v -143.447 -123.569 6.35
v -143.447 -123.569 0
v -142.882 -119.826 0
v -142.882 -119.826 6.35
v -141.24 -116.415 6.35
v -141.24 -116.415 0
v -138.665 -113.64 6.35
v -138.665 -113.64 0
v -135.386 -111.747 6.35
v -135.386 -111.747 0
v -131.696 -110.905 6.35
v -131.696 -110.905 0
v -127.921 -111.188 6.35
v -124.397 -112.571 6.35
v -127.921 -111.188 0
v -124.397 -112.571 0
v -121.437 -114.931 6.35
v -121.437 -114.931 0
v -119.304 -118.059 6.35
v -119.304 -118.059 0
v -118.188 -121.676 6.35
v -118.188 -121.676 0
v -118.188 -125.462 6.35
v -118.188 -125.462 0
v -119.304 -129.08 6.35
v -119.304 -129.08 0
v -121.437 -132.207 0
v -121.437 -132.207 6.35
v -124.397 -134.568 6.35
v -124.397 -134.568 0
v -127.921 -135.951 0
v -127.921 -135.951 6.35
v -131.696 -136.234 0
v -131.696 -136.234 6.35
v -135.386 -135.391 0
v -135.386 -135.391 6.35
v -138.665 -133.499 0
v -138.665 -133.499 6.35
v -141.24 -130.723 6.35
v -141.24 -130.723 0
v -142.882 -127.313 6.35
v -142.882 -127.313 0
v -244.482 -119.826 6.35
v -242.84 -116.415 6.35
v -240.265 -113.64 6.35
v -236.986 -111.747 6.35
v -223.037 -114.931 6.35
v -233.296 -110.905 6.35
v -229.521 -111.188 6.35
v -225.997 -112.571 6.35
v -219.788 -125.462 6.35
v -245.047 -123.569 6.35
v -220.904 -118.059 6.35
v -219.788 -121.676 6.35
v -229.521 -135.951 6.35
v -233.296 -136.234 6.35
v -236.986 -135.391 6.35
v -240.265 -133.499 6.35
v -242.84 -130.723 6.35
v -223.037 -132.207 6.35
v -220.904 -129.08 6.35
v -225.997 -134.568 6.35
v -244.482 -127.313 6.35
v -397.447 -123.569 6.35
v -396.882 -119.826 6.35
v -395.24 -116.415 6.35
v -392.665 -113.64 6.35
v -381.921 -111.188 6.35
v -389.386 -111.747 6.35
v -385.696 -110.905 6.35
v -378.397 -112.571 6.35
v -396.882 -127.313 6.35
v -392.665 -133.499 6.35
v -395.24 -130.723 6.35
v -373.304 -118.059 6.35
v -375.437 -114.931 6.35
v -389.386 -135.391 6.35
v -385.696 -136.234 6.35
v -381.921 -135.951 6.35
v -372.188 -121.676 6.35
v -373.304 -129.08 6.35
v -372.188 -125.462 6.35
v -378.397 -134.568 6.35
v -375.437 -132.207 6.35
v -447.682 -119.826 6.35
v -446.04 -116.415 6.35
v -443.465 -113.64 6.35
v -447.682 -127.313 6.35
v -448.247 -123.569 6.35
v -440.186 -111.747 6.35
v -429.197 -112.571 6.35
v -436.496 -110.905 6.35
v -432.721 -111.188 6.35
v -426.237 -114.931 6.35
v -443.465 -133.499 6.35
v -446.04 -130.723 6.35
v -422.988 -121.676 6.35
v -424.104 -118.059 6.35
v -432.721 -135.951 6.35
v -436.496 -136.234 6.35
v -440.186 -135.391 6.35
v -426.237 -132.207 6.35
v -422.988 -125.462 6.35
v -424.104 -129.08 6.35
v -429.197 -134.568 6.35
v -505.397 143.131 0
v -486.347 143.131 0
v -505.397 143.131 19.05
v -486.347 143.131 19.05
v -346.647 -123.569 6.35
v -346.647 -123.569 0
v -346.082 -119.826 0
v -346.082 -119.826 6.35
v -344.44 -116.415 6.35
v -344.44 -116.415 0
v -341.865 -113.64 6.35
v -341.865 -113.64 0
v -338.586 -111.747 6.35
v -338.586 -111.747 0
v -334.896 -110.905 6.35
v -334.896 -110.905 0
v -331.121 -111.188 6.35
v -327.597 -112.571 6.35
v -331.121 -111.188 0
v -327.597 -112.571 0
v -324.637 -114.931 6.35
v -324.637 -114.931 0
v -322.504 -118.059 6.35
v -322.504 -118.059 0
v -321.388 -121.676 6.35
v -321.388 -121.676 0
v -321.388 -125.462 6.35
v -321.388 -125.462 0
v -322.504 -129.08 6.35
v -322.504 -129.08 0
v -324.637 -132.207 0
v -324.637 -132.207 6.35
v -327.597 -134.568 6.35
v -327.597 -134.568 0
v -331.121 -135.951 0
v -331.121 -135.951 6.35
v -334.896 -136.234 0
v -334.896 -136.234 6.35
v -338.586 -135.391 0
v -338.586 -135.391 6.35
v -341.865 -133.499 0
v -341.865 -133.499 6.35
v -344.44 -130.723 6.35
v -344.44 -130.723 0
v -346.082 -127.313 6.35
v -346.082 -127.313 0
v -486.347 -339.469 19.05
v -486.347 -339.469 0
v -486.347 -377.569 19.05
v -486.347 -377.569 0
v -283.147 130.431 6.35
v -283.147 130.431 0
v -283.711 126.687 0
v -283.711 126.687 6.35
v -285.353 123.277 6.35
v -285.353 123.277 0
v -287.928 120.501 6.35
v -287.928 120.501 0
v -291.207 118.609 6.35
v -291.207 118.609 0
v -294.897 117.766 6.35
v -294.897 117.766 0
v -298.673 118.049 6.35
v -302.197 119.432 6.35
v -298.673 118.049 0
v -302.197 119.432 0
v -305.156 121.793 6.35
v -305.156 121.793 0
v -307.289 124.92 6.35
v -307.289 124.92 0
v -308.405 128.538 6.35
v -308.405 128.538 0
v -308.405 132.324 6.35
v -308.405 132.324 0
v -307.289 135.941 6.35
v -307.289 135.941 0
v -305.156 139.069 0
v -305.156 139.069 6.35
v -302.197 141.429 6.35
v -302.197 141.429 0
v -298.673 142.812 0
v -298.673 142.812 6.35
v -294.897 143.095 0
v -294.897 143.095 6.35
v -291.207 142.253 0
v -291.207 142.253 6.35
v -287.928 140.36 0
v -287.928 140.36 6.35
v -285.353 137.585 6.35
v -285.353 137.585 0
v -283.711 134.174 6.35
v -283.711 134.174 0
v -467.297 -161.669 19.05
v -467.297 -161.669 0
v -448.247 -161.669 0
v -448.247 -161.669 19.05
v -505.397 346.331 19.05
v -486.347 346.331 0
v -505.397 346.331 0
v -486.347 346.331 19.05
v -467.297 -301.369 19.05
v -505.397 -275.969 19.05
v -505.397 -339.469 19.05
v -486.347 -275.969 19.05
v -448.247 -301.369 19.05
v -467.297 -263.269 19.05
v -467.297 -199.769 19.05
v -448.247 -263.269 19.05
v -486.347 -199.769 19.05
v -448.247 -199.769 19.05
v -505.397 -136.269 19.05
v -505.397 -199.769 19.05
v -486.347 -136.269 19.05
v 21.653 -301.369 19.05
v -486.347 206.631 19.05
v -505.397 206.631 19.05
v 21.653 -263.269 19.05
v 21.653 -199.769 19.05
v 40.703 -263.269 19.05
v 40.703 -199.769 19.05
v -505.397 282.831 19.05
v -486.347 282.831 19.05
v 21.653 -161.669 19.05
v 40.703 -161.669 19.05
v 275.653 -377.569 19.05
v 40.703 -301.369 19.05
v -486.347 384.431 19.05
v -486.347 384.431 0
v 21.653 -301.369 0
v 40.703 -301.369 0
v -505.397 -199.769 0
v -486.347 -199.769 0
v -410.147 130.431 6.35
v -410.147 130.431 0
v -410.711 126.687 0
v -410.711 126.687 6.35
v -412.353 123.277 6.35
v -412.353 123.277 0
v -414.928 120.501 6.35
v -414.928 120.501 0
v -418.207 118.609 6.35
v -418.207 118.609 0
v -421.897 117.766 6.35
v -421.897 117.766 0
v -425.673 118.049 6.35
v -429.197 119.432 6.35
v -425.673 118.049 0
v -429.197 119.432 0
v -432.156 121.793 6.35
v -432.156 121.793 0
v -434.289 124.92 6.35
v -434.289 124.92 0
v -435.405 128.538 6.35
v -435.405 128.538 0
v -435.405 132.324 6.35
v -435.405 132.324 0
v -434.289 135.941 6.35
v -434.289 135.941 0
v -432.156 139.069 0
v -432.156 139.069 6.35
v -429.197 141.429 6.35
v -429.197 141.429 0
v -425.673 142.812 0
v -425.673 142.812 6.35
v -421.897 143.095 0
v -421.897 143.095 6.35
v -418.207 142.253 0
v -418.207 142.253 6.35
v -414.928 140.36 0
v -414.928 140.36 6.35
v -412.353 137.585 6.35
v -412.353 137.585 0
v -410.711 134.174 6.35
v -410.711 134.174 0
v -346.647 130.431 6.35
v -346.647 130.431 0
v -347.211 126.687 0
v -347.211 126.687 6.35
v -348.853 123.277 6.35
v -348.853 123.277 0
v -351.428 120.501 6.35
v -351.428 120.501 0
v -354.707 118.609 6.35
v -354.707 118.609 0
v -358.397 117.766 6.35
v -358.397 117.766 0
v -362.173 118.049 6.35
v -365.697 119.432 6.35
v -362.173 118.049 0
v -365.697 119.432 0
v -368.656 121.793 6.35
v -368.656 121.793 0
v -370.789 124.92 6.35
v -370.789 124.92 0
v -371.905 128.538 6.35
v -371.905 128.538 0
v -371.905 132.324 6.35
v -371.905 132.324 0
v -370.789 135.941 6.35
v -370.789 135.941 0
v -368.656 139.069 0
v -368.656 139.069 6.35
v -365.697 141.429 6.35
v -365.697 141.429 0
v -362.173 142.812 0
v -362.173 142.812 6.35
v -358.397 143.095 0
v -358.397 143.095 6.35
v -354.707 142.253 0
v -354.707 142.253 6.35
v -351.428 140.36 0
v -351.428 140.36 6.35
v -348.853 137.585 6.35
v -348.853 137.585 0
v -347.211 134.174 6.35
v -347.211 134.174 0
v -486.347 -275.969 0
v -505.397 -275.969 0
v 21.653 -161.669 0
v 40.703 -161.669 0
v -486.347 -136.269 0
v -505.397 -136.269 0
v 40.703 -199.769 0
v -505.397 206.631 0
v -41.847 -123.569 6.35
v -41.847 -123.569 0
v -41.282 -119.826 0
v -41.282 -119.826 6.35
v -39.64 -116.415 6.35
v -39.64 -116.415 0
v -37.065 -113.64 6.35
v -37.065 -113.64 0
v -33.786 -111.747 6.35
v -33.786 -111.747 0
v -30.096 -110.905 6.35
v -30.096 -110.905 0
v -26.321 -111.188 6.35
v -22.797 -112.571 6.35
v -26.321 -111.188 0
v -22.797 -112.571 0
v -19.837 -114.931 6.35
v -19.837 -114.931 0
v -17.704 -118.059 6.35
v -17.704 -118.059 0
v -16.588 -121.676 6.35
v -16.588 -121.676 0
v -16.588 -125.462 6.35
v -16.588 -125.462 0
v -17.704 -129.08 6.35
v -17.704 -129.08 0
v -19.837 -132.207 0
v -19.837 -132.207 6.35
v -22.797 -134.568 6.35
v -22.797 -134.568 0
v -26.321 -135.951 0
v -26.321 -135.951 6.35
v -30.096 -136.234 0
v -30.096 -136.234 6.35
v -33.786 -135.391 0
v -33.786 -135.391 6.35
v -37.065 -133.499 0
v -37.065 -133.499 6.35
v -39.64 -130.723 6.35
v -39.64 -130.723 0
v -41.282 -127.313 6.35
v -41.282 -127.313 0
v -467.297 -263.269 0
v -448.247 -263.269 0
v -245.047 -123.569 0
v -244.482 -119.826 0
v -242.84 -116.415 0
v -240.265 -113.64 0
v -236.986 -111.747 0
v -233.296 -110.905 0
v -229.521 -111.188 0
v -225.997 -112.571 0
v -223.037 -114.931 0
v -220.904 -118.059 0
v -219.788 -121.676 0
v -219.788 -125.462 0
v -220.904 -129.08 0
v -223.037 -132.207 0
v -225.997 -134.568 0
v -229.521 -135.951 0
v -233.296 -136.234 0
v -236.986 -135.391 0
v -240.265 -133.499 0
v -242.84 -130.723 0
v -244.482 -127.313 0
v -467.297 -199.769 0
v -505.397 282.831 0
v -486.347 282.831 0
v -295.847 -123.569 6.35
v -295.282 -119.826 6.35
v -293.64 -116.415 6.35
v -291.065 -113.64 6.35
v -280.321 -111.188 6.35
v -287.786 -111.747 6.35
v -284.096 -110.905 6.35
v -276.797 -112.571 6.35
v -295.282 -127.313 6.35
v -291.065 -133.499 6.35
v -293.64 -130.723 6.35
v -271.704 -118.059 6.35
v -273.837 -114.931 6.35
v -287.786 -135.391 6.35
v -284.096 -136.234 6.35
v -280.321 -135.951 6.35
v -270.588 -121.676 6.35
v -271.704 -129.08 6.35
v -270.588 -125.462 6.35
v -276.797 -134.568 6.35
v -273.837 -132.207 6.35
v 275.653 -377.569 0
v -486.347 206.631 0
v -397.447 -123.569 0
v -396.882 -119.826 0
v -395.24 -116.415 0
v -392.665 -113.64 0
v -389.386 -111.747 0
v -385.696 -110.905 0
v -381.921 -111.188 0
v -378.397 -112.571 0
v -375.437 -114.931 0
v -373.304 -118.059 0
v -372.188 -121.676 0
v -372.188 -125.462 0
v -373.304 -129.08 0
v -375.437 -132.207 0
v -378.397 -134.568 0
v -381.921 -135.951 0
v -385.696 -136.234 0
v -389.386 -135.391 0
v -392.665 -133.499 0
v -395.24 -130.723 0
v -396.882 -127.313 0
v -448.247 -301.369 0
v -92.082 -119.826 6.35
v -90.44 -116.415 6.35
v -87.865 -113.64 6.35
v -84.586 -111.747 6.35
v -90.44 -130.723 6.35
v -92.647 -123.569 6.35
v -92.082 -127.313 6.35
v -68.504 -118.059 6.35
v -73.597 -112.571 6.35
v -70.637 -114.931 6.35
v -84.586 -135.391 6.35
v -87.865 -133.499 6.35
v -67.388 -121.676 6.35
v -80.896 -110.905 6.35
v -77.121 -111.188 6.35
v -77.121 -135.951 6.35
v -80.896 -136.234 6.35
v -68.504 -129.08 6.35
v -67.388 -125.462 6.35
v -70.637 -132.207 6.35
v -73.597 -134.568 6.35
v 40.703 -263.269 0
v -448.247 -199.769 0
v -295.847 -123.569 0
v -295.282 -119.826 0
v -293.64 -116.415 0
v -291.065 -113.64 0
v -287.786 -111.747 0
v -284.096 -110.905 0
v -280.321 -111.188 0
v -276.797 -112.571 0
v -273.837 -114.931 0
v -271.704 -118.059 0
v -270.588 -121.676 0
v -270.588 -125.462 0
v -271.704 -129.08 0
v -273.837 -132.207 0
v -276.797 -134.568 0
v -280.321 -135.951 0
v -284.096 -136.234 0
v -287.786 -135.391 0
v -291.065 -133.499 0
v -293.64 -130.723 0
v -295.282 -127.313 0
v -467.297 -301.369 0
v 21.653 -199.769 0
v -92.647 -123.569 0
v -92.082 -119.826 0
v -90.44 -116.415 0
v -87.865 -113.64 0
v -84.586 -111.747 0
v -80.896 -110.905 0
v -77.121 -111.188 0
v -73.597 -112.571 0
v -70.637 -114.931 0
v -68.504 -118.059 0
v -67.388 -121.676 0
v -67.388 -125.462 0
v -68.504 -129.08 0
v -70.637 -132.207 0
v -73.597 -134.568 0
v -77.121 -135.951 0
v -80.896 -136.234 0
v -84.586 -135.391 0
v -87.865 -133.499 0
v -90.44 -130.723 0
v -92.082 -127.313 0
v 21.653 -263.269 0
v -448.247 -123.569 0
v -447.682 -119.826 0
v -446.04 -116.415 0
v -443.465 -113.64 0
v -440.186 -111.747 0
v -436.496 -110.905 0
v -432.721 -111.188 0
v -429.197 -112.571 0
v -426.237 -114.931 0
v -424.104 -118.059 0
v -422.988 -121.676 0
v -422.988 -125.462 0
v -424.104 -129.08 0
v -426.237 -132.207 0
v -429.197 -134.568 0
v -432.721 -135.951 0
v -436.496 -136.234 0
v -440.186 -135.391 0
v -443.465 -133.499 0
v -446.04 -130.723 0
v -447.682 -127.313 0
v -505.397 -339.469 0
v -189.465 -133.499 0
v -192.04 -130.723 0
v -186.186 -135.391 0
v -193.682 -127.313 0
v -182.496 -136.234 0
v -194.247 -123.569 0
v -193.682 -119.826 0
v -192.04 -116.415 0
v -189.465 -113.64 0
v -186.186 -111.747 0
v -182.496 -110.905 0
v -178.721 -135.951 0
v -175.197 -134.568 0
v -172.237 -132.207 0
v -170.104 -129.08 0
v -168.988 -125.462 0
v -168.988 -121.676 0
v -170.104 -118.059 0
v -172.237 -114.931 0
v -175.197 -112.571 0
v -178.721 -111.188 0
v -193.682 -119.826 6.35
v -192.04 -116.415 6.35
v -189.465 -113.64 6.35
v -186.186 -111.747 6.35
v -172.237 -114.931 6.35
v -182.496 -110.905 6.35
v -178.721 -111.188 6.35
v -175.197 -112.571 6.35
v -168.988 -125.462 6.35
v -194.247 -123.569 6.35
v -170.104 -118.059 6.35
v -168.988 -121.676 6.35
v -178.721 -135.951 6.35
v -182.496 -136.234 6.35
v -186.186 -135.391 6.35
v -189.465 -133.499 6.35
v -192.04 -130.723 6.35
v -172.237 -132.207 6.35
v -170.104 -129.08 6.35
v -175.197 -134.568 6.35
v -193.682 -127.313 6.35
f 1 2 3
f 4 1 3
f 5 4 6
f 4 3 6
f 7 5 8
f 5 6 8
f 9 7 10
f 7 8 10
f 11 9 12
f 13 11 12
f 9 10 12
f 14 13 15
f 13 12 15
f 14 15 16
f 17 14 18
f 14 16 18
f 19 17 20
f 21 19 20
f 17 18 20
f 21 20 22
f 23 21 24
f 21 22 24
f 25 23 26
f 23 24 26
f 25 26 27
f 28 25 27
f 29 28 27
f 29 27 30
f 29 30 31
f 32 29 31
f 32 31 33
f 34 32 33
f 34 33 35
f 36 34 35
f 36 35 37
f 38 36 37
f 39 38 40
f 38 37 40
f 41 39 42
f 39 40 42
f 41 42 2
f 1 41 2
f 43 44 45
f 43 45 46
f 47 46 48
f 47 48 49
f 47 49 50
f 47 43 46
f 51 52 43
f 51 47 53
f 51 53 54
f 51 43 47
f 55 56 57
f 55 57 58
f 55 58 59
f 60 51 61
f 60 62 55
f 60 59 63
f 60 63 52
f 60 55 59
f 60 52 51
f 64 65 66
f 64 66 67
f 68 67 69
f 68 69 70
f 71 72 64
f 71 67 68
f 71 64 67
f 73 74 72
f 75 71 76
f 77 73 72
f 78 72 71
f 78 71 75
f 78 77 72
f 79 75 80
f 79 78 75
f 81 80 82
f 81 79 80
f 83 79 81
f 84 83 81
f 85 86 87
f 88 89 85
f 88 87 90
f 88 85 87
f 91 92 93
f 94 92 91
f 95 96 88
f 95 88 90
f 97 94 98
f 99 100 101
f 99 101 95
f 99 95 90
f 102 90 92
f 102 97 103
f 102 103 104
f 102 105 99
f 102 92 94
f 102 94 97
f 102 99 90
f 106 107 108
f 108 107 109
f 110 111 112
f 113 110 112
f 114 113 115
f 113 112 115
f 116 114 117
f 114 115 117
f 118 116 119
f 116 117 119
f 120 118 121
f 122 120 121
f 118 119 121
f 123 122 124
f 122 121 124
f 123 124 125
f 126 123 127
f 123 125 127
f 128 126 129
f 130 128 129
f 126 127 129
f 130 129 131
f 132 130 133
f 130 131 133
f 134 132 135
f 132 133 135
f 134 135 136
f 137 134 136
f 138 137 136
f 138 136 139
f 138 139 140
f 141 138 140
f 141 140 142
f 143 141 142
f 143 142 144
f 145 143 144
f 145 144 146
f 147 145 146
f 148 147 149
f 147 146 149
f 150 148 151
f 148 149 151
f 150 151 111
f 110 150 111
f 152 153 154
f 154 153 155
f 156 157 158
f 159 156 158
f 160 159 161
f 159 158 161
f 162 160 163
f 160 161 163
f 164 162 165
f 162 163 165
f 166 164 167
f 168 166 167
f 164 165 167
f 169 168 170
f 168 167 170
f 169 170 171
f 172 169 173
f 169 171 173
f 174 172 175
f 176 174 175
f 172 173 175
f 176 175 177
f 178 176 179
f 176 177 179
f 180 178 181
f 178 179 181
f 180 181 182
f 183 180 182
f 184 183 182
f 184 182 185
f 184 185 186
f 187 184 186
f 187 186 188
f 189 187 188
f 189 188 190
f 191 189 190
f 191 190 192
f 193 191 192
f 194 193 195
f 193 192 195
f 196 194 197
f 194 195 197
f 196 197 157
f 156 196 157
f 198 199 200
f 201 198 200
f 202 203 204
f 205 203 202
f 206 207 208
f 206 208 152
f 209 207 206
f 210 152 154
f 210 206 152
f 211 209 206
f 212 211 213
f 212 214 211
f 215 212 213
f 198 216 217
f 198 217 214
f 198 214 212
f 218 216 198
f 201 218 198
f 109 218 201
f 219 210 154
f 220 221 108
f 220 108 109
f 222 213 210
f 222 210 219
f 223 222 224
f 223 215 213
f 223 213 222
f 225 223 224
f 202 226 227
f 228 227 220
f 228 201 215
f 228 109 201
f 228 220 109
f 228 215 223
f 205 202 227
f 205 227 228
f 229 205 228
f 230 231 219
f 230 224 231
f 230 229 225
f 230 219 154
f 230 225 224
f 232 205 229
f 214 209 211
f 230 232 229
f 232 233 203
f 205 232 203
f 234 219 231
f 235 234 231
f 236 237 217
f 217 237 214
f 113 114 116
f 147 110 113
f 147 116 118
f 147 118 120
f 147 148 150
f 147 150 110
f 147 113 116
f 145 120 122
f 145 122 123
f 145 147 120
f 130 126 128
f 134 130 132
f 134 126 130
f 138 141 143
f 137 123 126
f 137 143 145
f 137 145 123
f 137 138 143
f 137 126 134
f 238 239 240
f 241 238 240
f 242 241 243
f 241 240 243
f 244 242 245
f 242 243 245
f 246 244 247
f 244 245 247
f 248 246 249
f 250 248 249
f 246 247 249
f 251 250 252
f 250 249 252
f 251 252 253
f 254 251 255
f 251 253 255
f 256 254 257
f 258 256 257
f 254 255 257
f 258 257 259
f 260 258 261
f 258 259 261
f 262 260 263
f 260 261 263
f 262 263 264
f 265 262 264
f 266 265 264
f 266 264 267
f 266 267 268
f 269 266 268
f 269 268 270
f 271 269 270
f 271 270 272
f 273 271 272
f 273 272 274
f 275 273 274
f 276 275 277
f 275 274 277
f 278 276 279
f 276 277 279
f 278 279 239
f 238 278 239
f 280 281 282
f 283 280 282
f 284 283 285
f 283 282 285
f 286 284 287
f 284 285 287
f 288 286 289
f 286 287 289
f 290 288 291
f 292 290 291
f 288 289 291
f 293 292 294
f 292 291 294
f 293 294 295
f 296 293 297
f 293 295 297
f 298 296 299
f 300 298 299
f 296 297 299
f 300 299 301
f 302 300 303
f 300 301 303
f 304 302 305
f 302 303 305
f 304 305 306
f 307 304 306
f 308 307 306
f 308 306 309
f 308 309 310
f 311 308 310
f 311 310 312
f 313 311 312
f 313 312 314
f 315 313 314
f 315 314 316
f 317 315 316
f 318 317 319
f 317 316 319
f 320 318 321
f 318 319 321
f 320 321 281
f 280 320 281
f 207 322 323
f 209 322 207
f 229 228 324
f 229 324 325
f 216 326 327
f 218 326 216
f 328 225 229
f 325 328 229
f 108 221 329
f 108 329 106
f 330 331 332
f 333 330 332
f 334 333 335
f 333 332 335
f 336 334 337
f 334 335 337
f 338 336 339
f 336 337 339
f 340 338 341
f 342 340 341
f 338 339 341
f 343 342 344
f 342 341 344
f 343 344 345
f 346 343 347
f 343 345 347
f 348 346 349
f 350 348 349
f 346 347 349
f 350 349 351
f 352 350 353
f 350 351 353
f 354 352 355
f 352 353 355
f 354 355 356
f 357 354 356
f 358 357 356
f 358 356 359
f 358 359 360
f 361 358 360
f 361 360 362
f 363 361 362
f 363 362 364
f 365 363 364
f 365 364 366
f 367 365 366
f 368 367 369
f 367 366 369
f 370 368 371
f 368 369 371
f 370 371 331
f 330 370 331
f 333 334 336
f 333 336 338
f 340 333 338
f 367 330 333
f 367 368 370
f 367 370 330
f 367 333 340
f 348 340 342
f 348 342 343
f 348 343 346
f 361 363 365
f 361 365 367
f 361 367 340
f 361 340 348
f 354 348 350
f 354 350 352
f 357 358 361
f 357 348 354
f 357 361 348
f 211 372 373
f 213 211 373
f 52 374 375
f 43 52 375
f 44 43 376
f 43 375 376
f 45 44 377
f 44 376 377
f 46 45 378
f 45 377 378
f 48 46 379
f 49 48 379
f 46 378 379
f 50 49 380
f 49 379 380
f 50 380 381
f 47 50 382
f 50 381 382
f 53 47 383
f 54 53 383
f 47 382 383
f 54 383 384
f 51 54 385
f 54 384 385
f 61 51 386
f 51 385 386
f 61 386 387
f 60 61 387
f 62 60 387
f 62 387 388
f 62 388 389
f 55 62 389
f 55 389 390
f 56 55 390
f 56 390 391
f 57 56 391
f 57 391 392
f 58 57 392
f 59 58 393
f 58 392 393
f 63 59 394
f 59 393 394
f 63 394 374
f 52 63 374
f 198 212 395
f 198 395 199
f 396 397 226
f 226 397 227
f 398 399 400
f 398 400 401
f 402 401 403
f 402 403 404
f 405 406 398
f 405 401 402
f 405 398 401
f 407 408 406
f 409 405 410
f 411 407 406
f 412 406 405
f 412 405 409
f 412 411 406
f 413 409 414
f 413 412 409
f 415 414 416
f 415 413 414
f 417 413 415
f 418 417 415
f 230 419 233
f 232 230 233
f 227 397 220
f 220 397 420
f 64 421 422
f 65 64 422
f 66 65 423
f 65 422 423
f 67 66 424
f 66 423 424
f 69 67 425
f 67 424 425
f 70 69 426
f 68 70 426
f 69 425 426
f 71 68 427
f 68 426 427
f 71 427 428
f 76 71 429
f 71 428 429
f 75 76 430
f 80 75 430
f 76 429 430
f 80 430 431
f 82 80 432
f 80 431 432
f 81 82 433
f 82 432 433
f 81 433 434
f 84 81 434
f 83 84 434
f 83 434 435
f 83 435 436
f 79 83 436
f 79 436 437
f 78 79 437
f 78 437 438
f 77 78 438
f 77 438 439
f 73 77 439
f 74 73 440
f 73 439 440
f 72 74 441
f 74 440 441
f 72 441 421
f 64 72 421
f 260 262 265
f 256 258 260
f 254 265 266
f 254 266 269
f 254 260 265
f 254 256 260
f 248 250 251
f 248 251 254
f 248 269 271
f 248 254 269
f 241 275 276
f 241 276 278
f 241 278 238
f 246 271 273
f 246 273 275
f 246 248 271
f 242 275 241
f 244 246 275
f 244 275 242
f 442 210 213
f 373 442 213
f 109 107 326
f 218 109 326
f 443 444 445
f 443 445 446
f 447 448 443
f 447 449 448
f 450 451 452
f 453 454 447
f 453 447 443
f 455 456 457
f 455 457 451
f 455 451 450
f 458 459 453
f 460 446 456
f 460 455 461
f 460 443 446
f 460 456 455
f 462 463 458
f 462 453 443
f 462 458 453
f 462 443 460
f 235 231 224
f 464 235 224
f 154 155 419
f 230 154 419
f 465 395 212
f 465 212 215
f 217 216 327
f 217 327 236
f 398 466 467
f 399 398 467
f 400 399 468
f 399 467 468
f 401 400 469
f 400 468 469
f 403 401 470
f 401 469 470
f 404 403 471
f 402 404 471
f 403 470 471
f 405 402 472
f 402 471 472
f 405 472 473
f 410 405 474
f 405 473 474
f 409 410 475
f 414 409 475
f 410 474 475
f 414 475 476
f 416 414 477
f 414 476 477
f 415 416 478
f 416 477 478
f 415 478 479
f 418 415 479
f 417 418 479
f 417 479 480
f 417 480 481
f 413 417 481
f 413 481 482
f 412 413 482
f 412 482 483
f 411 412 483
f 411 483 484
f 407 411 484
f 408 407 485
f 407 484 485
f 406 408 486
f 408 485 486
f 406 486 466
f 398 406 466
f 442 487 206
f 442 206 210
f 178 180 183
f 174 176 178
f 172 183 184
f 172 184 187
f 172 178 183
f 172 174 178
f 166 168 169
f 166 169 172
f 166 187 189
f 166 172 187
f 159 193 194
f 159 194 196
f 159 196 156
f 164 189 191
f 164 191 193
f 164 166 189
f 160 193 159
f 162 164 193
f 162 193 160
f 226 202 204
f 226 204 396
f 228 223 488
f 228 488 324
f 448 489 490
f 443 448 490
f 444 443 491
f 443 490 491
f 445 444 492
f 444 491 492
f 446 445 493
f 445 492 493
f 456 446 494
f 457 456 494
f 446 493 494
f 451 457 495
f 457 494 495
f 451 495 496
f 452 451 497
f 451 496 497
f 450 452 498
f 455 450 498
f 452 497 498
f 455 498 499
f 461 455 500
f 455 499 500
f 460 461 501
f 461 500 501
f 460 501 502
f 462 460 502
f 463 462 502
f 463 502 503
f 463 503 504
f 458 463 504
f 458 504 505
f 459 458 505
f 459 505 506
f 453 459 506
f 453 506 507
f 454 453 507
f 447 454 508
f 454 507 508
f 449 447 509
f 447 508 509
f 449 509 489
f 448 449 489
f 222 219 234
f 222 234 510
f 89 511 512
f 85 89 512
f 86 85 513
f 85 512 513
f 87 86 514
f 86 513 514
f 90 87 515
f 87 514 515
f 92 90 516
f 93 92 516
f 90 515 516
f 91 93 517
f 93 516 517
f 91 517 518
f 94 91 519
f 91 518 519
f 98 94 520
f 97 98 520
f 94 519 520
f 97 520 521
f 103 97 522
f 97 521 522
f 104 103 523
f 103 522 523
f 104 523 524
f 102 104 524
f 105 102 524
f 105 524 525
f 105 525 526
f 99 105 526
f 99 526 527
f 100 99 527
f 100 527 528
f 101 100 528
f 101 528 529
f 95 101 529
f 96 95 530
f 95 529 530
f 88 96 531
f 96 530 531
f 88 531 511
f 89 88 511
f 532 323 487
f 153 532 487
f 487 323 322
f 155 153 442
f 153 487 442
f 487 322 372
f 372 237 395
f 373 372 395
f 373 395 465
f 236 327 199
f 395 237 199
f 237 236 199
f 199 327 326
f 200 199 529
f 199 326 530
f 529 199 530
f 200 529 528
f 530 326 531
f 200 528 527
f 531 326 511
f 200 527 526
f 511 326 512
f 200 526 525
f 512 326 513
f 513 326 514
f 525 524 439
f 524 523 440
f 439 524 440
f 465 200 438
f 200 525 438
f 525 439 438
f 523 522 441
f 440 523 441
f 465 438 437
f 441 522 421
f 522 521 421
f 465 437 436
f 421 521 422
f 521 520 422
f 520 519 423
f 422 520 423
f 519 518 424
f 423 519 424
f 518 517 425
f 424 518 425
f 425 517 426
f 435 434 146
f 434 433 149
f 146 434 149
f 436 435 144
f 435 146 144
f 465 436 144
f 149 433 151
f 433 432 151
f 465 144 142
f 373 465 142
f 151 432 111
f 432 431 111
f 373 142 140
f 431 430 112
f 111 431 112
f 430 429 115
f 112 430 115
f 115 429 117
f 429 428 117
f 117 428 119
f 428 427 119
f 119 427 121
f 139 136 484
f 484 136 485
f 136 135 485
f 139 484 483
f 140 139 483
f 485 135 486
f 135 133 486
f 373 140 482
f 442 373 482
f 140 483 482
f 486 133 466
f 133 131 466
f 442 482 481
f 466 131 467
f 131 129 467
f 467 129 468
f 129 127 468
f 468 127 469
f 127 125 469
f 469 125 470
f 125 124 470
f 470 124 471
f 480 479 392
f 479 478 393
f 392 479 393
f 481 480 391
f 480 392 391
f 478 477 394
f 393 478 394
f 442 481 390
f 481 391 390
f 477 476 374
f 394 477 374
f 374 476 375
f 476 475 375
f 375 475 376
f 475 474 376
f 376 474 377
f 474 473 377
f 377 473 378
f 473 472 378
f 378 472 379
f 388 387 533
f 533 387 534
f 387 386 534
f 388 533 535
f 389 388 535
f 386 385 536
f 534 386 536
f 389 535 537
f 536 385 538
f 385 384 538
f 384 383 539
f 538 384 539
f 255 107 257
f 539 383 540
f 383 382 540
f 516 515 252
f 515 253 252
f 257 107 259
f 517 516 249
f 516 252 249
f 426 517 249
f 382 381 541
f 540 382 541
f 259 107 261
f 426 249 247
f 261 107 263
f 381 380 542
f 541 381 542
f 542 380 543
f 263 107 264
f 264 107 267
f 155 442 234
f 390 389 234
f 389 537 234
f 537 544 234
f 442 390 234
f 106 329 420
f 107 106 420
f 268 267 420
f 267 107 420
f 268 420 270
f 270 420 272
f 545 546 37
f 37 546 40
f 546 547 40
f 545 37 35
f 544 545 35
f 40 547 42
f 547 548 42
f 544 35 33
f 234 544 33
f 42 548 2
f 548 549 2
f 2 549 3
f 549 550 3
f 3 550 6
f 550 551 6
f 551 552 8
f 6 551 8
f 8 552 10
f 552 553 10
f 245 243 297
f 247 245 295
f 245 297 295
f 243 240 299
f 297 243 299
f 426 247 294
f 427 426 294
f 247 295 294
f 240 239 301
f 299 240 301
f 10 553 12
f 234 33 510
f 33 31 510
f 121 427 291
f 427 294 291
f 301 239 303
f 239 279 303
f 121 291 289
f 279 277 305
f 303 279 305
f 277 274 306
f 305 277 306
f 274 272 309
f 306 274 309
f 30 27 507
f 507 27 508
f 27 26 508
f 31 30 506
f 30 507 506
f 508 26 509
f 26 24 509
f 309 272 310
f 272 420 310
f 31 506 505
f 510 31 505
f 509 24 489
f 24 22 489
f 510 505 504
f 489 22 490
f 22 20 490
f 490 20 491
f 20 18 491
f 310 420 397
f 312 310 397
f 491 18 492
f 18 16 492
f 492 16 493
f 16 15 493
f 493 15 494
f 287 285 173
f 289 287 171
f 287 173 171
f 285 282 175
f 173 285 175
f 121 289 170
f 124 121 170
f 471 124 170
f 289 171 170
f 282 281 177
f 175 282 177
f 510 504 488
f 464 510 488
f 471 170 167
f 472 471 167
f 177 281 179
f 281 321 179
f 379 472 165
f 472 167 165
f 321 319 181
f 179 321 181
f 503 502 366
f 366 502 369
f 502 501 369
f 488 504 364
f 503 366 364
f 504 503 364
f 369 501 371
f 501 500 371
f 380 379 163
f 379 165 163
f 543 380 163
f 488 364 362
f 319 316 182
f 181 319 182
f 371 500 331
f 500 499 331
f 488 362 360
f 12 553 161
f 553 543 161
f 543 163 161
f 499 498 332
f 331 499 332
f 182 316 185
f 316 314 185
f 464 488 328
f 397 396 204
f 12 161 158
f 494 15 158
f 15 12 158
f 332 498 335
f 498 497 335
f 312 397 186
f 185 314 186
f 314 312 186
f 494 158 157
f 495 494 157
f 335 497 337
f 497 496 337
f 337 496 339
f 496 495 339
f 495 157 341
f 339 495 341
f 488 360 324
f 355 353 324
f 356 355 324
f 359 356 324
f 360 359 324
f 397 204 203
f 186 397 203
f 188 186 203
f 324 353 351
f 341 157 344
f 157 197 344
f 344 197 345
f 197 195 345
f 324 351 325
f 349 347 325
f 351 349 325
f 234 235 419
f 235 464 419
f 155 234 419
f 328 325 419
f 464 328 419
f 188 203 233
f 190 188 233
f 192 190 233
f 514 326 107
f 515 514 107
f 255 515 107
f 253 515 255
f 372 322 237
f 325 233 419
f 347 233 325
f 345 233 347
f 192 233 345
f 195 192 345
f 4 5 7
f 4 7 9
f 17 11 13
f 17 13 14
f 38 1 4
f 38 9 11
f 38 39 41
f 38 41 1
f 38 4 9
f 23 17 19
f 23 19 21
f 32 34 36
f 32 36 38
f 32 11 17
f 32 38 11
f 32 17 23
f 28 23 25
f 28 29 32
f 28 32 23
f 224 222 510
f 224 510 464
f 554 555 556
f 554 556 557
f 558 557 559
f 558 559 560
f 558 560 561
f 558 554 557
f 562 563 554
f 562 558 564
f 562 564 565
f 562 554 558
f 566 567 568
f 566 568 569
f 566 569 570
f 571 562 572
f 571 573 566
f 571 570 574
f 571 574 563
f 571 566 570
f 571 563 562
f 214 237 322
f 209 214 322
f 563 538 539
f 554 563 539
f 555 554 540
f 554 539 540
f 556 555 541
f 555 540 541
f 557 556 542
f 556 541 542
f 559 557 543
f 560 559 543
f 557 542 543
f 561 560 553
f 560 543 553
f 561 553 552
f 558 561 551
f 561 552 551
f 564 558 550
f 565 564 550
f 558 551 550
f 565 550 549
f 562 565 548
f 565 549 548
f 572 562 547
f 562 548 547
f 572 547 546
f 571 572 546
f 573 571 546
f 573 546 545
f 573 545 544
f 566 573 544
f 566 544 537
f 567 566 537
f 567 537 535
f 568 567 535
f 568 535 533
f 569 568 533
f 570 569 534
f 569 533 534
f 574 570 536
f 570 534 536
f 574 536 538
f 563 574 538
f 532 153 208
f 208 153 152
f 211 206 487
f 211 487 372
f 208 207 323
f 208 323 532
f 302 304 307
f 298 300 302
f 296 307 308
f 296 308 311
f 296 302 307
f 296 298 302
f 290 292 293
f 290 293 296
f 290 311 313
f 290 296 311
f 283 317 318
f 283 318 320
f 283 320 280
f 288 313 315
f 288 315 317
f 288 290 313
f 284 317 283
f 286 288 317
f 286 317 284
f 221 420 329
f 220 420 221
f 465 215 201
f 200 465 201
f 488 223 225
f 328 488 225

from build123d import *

# Parameters (mm, degrees)
F1_DEPTH = 19.05
F3_DEPTH = 6.35
F4_W     = 19.05
F4_H     = 38.1
F5_DEPTH = 25.4
F6_W     = 63.5
F6_H     = 19.05
F7_DEPTH = 19.05


with BuildPart() as f1:
    # F0 (on Top) → F1 (new body)
    with BuildSketch(Plane.XY):
        Polygon((-486.346572, 384.430752), (-486.346572, -377.569248), (275.653428, -377.569248), align=None)
    extrude(amount=F1_DEPTH)

    # F2 (on face) → F3 (cut)
    with BuildSketch(Plane(origin=(0, 0, 0), x_dir=(1, 0, 0), z_dir=(0, 0, -1))):
        with BuildLine():
            ThreePointArc((-422.846572, 123.569248), (-435.546572, 136.269248), (-448.246572, 123.569248))
            Line((-448.246572, 123.569248), (-422.846572, 123.569248))
        make_face()
        with BuildLine():
            ThreePointArc((-16.446572, 123.569248), (-29.146572, 136.269248), (-41.846572, 123.569248))
            Line((-41.846572, 123.569248), (-16.446572, 123.569248))
        make_face()
        with BuildLine():
            Line((-16.446572, 123.569248), (-41.846572, 123.569248))
            ThreePointArc((-41.846572, 123.569248), (-29.146572, 110.869248), (-16.446572, 123.569248))
        make_face()
        with BuildLine():
            ThreePointArc((-67.246572, 123.569248), (-79.946572, 136.269248), (-92.646572, 123.569248))
            Line((-92.646572, 123.569248), (-67.246572, 123.569248))
        make_face()
        with BuildLine():
            Line((-67.246572, 123.569248), (-92.646572, 123.569248))
            ThreePointArc((-92.646572, 123.569248), (-79.946572, 110.869248), (-67.246572, 123.569248))
        make_face()
        with BuildLine():
            ThreePointArc((-118.046572, 123.569248), (-130.746572, 136.269248), (-143.446572, 123.569248))
            Line((-143.446572, 123.569248), (-118.046572, 123.569248))
        make_face()
        with BuildLine():
            Line((-118.046572, 123.569248), (-143.446572, 123.569248))
            ThreePointArc((-143.446572, 123.569248), (-130.746572, 110.869248), (-118.046572, 123.569248))
        make_face()
        with BuildLine():
            ThreePointArc((-168.846572, 123.569248), (-181.546572, 136.269248), (-194.246572, 123.569248))
            Line((-194.246572, 123.569248), (-168.846572, 123.569248))
        make_face()
        with BuildLine():
            Line((-168.846572, 123.569248), (-194.246572, 123.569248))
            ThreePointArc((-194.246572, 123.569248), (-181.546572, 110.869248), (-168.846572, 123.569248))
        make_face()
        with BuildLine():
            ThreePointArc((-219.646572, 123.569248), (-232.346572, 136.269248), (-245.046572, 123.569248))
            Line((-245.046572, 123.569248), (-219.646572, 123.569248))
        make_face()
        with BuildLine():
            Line((-219.646572, 123.569248), (-245.046572, 123.569248))
            ThreePointArc((-245.046572, 123.569248), (-232.346572, 110.869248), (-219.646572, 123.569248))
        make_face()
        with BuildLine():
            ThreePointArc((-270.446572, 123.569248), (-283.146572, 136.269248), (-295.846572, 123.569248))
            Line((-295.846572, 123.569248), (-270.446572, 123.569248))
        make_face()
        with BuildLine():
            Line((-270.446572, 123.569248), (-295.846572, 123.569248))
            ThreePointArc((-295.846572, 123.569248), (-283.146572, 110.869248), (-270.446572, 123.569248))
        make_face()
        with BuildLine():
            ThreePointArc((-321.246572, 123.569248), (-333.946572, 136.269248), (-346.646572, 123.569248))
            Line((-346.646572, 123.569248), (-321.246572, 123.569248))
        make_face()
        with BuildLine():
            Line((-321.246572, 123.569248), (-346.646572, 123.569248))
            ThreePointArc((-346.646572, 123.569248), (-333.946572, 110.869248), (-321.246572, 123.569248))
        make_face()
        with BuildLine():
            ThreePointArc((-372.046572, 123.569248), (-384.746572, 136.269248), (-397.446572, 123.569248))
            Line((-397.446572, 123.569248), (-372.046572, 123.569248))
        make_face()
        with BuildLine():
            Line((-372.046572, 123.569248), (-397.446572, 123.569248))
            ThreePointArc((-397.446572, 123.569248), (-384.746572, 110.869248), (-372.046572, 123.569248))
        make_face()
        with BuildLine():
            Line((-422.846572, 123.569248), (-448.246572, 123.569248))
            ThreePointArc((-448.246572, 123.569248), (-435.546572, 110.869248), (-422.846572, 123.569248))
        make_face()
        with BuildLine():
            ThreePointArc((-308.546572, -130.430752), (-295.846572, -143.130752), (-283.146572, -130.430752))
            Line((-283.146572, -130.430752), (-308.546572, -130.430752))
        make_face()
        with BuildLine():
            Line((-308.546572, -130.430752), (-283.146572, -130.430752))
            ThreePointArc((-283.146572, -130.430752), (-295.846572, -117.730752), (-308.546572, -130.430752))
        make_face()
        with BuildLine():
            ThreePointArc((-435.546572, -130.430752), (-422.846572, -143.130752), (-410.146572, -130.430752))
            Line((-410.146572, -130.430752), (-435.546572, -130.430752))
        make_face()
        with BuildLine():
            Line((-435.546572, -130.430752), (-410.146572, -130.430752))
            ThreePointArc((-410.146572, -130.430752), (-422.846572, -117.730752), (-435.546572, -130.430752))
        make_face()
        with BuildLine():
            ThreePointArc((-372.046572, -130.430752), (-359.346572, -143.130752), (-346.646572, -130.430752))
            Line((-346.646572, -130.430752), (-372.046572, -130.430752))
        make_face()
        with BuildLine():
            Line((-372.046572, -130.430752), (-346.646572, -130.430752))
            ThreePointArc((-346.646572, -130.430752), (-359.346572, -117.730752), (-372.046572, -130.430752))
        make_face()
    extrude(amount=-F3_DEPTH, mode=Mode.SUBTRACT)

    # F4 (on face) → F5 (cut)
    with BuildSketch(Plane.XY.offset(19.05)):
        with Locations((-457.771572, -282.319248)):
            Rectangle(F4_W, F4_H)
        with Locations((-457.771572, -180.719248)):
            Rectangle(F4_W, F4_H)
        with Locations((31.178428, -282.319248)):
            Rectangle(F4_W, F4_H)
        with Locations((31.178428, -180.719248)):
            Rectangle(F4_W, F4_H)
    extrude(amount=-F5_DEPTH, mode=Mode.SUBTRACT)

    # F6 (on face) → F7 (join)
    with BuildSketch(Plane(origin=(-486.346572, 0, 0), x_dir=(0, -1, 0), z_dir=(-1, 0, 0))):
        with Locations((-314.580752, 9.525)):
            Rectangle(F6_W, F6_H)
        with Locations((307.719248, 9.525)):
            Rectangle(F6_W, F6_H)
        with Locations((168.019248, 9.525)):
            Rectangle(F6_W, F6_H)
        with Locations((-174.880752, 9.525)):
            Rectangle(F6_W, F6_H)
    extrude(amount=F7_DEPTH)


solid = f1.part
